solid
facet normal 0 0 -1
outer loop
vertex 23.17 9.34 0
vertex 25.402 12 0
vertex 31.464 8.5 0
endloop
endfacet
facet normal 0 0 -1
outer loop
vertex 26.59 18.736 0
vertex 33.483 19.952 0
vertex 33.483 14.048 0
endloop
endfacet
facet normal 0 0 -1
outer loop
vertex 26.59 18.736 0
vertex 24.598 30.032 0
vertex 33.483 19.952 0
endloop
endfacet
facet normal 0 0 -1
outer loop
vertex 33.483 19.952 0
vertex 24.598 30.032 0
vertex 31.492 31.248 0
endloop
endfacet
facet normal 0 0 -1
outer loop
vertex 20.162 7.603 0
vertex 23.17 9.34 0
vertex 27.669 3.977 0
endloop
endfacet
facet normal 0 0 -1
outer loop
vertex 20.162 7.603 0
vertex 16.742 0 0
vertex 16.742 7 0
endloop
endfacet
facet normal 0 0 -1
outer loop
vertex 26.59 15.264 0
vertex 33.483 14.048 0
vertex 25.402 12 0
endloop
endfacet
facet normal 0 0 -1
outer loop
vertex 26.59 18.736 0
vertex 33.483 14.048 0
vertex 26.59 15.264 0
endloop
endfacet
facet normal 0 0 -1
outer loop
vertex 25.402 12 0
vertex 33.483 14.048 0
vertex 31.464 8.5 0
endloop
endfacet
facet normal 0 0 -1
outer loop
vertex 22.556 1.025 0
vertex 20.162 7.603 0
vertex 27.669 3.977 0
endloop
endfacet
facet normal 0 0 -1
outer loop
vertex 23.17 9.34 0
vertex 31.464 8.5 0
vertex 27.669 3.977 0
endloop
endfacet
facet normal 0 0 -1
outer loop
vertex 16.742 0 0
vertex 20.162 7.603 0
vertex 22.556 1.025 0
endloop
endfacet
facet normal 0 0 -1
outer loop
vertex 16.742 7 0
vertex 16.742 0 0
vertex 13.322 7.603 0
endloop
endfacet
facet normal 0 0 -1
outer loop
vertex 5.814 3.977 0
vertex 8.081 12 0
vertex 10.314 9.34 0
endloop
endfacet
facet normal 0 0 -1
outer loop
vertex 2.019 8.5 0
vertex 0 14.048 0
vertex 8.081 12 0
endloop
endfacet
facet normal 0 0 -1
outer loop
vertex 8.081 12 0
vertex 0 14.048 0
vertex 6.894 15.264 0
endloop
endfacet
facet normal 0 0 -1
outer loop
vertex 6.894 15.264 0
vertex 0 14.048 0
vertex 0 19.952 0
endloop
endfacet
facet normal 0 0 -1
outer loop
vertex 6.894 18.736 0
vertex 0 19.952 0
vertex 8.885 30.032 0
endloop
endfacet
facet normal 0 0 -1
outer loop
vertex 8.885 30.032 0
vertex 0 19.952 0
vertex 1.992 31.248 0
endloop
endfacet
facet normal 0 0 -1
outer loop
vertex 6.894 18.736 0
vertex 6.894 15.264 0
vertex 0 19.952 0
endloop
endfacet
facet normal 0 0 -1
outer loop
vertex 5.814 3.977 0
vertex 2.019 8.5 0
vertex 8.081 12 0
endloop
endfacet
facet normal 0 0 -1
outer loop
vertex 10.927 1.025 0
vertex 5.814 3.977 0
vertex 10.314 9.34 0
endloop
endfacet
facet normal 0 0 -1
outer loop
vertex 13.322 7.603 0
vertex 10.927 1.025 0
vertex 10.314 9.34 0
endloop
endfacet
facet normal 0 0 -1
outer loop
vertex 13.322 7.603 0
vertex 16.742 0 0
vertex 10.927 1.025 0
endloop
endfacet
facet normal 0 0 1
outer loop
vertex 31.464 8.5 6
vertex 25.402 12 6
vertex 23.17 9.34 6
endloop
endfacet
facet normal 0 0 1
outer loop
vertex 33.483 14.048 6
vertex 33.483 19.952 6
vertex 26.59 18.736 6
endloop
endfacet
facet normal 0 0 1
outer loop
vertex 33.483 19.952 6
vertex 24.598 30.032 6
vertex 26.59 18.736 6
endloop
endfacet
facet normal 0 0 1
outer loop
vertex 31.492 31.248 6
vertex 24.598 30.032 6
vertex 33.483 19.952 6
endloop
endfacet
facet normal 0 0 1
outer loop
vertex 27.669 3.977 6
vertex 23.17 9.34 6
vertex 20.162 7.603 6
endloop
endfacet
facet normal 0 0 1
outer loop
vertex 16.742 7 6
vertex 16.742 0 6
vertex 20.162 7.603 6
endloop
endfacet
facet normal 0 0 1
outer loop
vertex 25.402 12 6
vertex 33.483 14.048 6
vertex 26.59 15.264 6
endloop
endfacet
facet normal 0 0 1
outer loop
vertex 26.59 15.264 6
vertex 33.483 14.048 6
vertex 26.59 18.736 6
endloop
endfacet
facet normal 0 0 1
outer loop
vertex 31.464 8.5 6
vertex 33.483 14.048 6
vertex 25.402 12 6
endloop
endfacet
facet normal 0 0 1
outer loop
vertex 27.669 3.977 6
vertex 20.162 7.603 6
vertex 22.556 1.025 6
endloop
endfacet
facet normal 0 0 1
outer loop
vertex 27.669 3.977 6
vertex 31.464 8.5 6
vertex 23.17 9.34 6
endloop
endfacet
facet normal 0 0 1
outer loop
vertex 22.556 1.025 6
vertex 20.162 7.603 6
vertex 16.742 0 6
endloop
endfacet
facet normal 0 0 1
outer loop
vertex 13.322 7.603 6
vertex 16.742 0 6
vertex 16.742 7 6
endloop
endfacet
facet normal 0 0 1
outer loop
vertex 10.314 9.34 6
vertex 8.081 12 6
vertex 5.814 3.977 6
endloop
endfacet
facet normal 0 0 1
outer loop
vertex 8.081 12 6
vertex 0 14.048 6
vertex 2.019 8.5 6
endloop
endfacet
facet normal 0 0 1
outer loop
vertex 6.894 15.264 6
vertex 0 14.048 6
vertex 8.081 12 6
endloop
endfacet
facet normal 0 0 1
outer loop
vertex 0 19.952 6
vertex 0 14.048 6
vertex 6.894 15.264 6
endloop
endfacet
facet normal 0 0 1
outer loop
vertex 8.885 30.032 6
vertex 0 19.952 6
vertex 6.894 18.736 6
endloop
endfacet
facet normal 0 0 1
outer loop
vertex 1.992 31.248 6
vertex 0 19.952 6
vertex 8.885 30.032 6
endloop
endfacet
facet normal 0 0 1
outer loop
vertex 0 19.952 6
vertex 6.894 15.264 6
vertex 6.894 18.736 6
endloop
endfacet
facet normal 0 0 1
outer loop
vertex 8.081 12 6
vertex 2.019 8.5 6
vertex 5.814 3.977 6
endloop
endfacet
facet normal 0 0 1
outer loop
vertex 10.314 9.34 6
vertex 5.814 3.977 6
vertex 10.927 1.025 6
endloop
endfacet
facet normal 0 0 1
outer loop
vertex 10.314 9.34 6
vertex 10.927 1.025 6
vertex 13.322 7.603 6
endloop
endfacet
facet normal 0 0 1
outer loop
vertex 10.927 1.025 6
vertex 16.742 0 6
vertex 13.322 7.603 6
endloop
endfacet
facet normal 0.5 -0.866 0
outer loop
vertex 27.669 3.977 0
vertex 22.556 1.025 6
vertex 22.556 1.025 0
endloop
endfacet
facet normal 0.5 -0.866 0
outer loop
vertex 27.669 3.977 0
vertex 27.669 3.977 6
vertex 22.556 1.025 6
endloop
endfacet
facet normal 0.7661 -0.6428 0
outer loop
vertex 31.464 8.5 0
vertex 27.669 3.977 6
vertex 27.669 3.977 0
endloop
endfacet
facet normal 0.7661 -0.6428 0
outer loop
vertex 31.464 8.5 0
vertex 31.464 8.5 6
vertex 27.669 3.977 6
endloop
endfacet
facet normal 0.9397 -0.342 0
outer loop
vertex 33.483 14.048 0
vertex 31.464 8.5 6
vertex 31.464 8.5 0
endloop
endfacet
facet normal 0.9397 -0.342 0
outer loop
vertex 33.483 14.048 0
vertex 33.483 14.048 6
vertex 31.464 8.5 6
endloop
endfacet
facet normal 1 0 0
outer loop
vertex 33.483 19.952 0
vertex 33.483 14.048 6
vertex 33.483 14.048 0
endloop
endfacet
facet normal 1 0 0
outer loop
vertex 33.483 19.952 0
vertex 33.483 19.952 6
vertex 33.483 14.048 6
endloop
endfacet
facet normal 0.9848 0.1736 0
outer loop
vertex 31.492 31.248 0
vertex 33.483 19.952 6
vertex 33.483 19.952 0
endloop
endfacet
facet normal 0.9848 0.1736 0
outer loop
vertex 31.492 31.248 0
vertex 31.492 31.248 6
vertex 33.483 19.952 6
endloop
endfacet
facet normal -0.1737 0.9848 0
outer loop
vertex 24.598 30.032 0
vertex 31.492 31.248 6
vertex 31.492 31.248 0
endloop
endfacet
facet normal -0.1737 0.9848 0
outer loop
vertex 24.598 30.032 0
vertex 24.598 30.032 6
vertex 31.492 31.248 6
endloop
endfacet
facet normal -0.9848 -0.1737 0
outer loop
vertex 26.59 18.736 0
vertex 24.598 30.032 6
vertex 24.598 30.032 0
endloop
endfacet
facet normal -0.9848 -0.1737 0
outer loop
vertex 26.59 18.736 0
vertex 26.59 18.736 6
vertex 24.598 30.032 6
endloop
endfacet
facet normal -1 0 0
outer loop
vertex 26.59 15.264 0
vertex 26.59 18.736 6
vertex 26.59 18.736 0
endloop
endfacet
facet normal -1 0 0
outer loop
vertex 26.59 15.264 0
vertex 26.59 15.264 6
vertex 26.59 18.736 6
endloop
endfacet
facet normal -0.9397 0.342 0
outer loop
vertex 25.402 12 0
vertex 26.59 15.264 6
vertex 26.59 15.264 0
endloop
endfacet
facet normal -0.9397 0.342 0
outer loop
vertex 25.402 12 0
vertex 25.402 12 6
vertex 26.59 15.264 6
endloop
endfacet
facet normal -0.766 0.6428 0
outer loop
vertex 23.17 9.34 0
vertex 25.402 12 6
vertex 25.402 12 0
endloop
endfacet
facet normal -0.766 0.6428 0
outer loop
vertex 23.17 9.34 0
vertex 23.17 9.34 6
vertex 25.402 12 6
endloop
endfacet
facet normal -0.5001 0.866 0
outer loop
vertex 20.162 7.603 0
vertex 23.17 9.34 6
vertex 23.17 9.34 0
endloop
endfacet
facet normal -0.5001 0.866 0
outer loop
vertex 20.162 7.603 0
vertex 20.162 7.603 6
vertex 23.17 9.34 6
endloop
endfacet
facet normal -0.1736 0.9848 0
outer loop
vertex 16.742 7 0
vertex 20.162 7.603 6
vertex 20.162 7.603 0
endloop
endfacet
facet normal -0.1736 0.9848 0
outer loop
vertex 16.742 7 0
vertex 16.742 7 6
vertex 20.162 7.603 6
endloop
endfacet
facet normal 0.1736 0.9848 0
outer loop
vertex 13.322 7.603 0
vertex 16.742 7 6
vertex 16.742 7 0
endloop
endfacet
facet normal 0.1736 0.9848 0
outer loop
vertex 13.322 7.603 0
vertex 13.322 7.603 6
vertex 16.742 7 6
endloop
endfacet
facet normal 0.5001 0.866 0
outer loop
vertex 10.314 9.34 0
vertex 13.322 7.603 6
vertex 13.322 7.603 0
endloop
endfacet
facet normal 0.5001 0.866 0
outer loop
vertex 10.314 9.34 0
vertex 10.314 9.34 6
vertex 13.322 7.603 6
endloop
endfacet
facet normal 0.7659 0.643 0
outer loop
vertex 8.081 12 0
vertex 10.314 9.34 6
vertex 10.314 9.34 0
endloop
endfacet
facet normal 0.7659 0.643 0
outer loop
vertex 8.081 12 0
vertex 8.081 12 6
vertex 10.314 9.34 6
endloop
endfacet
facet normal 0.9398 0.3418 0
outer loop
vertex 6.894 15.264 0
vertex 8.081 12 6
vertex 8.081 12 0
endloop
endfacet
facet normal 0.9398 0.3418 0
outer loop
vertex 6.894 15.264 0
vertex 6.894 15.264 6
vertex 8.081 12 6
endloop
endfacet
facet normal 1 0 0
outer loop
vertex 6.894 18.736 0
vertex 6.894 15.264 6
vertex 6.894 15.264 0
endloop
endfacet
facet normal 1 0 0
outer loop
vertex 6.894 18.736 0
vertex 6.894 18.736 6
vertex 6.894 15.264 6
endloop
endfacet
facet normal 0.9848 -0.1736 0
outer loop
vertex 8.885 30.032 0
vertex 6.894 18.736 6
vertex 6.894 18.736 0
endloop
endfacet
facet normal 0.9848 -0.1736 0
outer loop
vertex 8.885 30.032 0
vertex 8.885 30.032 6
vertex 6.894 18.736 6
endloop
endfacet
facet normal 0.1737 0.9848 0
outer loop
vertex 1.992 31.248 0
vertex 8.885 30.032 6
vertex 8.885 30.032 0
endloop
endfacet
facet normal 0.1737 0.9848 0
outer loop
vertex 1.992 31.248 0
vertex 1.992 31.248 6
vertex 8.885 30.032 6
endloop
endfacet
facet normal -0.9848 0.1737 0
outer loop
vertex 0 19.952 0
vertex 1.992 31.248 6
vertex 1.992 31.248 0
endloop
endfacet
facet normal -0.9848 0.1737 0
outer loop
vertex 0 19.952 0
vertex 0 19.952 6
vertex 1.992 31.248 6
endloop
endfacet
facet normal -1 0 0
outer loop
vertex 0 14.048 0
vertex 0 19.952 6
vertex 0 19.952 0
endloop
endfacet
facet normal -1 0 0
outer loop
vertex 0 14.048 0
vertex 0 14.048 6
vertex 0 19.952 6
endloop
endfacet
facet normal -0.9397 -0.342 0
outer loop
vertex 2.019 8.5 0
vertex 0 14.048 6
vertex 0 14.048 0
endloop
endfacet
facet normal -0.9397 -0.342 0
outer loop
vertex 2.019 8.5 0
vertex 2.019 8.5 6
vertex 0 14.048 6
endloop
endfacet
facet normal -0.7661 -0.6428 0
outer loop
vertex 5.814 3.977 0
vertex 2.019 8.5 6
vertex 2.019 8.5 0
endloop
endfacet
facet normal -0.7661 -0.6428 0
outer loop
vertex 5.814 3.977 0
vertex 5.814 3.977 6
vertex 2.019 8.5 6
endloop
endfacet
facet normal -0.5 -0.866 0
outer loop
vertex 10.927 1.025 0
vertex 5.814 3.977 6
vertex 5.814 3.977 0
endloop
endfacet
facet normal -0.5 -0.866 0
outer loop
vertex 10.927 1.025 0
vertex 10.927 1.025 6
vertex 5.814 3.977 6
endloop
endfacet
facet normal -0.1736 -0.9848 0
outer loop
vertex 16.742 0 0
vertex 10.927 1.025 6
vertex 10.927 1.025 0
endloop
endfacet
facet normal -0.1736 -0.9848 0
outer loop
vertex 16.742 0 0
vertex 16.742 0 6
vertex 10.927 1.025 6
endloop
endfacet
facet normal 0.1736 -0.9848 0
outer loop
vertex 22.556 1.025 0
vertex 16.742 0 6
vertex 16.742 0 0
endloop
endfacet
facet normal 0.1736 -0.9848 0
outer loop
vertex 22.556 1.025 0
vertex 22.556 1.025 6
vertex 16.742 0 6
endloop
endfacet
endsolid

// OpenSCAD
$fn = 32;

// ----------------------------------------------------------------------
// Clip blank: omega clip, 6 mm thick
// ----------------------------------------------------------------------

// --- parameters (mm) ---
profile_height = 6;       // extrusion height
profile_points = 26;      // points of the closed outline

profile = [[0, 19.952], [0, 14.048], [2.019, 8.5], [5.814, 3.977], [10.927, 1.025], [16.742, 0], [22.556, 1.025], [27.669, 3.977], [31.464, 8.5], [33.483, 14.048], [33.483, 19.952], [31.492, 31.248], [24.598, 30.032], [26.59, 18.736], [26.59, 15.264], [25.402, 12], [23.17, 9.34], [20.162, 7.603], [16.742, 7], [13.322, 7.603], [10.314, 9.34], [8.081, 12], [6.894, 15.264], [6.894, 18.736], [8.885, 30.032], [1.992, 31.248]];  // single closed polygon, 26 points, counter clockwise

// --- the one profile operation ---
linear_extrude(height = profile_height) polygon(points = profile);
